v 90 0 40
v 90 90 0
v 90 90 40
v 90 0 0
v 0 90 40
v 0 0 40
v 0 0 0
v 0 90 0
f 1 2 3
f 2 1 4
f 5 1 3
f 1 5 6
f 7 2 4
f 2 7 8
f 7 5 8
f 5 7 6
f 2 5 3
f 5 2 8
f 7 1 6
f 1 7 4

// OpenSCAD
// DIY magnetic stirrer housing - print orientation (upside down)
// Units: mm. Walls 2.5 mm thick. Top plate 2 mm thick.

// ---------- Parameters ----------
box_outer_x   = 90;    // outer length in X
box_outer_y   = 90;    // outer width in Y
wall_thick    = 2.5;   // wall thickness
top_thick     = 2;     // top plate thickness
open_height   = 40;     // box height at open top (z = 40)
screw_hole    = 4.5;    // M4 screw hole diameter
screw_pitch   = 71.5;   // square pitch of screw holes
notch_w       = 12;     // cable notch width
notch_depth   = 8;      // notch depth from open edge
eps           = 0.5;    // cutter overshoot past faces
$fn           = 96;     // curve resolution

// ---------- Model ----------
difference() {
    // Solid box: full height, open top (no lid)
    cube([box_outer_x, box_outer_y, open_height]);

    // Four screw holes through the top plate, centred on plate
    for (i = [0 : 3])
        translate([-screw_pitch/2, -screw_pitch/2, open_height - top_thick])
            cylinder(d = screw_hole, h = top_thick + eps);

    // Cable notch in one wall: centred along wall, reaches up to z = 32
    translate([-box_outer_x/2 + notch_w/2, -box_outer_y/2 + notch_w/2,
               open_height - notch_depth])
        cube([notch_w, notch_w, notch_depth + eps]);
}
